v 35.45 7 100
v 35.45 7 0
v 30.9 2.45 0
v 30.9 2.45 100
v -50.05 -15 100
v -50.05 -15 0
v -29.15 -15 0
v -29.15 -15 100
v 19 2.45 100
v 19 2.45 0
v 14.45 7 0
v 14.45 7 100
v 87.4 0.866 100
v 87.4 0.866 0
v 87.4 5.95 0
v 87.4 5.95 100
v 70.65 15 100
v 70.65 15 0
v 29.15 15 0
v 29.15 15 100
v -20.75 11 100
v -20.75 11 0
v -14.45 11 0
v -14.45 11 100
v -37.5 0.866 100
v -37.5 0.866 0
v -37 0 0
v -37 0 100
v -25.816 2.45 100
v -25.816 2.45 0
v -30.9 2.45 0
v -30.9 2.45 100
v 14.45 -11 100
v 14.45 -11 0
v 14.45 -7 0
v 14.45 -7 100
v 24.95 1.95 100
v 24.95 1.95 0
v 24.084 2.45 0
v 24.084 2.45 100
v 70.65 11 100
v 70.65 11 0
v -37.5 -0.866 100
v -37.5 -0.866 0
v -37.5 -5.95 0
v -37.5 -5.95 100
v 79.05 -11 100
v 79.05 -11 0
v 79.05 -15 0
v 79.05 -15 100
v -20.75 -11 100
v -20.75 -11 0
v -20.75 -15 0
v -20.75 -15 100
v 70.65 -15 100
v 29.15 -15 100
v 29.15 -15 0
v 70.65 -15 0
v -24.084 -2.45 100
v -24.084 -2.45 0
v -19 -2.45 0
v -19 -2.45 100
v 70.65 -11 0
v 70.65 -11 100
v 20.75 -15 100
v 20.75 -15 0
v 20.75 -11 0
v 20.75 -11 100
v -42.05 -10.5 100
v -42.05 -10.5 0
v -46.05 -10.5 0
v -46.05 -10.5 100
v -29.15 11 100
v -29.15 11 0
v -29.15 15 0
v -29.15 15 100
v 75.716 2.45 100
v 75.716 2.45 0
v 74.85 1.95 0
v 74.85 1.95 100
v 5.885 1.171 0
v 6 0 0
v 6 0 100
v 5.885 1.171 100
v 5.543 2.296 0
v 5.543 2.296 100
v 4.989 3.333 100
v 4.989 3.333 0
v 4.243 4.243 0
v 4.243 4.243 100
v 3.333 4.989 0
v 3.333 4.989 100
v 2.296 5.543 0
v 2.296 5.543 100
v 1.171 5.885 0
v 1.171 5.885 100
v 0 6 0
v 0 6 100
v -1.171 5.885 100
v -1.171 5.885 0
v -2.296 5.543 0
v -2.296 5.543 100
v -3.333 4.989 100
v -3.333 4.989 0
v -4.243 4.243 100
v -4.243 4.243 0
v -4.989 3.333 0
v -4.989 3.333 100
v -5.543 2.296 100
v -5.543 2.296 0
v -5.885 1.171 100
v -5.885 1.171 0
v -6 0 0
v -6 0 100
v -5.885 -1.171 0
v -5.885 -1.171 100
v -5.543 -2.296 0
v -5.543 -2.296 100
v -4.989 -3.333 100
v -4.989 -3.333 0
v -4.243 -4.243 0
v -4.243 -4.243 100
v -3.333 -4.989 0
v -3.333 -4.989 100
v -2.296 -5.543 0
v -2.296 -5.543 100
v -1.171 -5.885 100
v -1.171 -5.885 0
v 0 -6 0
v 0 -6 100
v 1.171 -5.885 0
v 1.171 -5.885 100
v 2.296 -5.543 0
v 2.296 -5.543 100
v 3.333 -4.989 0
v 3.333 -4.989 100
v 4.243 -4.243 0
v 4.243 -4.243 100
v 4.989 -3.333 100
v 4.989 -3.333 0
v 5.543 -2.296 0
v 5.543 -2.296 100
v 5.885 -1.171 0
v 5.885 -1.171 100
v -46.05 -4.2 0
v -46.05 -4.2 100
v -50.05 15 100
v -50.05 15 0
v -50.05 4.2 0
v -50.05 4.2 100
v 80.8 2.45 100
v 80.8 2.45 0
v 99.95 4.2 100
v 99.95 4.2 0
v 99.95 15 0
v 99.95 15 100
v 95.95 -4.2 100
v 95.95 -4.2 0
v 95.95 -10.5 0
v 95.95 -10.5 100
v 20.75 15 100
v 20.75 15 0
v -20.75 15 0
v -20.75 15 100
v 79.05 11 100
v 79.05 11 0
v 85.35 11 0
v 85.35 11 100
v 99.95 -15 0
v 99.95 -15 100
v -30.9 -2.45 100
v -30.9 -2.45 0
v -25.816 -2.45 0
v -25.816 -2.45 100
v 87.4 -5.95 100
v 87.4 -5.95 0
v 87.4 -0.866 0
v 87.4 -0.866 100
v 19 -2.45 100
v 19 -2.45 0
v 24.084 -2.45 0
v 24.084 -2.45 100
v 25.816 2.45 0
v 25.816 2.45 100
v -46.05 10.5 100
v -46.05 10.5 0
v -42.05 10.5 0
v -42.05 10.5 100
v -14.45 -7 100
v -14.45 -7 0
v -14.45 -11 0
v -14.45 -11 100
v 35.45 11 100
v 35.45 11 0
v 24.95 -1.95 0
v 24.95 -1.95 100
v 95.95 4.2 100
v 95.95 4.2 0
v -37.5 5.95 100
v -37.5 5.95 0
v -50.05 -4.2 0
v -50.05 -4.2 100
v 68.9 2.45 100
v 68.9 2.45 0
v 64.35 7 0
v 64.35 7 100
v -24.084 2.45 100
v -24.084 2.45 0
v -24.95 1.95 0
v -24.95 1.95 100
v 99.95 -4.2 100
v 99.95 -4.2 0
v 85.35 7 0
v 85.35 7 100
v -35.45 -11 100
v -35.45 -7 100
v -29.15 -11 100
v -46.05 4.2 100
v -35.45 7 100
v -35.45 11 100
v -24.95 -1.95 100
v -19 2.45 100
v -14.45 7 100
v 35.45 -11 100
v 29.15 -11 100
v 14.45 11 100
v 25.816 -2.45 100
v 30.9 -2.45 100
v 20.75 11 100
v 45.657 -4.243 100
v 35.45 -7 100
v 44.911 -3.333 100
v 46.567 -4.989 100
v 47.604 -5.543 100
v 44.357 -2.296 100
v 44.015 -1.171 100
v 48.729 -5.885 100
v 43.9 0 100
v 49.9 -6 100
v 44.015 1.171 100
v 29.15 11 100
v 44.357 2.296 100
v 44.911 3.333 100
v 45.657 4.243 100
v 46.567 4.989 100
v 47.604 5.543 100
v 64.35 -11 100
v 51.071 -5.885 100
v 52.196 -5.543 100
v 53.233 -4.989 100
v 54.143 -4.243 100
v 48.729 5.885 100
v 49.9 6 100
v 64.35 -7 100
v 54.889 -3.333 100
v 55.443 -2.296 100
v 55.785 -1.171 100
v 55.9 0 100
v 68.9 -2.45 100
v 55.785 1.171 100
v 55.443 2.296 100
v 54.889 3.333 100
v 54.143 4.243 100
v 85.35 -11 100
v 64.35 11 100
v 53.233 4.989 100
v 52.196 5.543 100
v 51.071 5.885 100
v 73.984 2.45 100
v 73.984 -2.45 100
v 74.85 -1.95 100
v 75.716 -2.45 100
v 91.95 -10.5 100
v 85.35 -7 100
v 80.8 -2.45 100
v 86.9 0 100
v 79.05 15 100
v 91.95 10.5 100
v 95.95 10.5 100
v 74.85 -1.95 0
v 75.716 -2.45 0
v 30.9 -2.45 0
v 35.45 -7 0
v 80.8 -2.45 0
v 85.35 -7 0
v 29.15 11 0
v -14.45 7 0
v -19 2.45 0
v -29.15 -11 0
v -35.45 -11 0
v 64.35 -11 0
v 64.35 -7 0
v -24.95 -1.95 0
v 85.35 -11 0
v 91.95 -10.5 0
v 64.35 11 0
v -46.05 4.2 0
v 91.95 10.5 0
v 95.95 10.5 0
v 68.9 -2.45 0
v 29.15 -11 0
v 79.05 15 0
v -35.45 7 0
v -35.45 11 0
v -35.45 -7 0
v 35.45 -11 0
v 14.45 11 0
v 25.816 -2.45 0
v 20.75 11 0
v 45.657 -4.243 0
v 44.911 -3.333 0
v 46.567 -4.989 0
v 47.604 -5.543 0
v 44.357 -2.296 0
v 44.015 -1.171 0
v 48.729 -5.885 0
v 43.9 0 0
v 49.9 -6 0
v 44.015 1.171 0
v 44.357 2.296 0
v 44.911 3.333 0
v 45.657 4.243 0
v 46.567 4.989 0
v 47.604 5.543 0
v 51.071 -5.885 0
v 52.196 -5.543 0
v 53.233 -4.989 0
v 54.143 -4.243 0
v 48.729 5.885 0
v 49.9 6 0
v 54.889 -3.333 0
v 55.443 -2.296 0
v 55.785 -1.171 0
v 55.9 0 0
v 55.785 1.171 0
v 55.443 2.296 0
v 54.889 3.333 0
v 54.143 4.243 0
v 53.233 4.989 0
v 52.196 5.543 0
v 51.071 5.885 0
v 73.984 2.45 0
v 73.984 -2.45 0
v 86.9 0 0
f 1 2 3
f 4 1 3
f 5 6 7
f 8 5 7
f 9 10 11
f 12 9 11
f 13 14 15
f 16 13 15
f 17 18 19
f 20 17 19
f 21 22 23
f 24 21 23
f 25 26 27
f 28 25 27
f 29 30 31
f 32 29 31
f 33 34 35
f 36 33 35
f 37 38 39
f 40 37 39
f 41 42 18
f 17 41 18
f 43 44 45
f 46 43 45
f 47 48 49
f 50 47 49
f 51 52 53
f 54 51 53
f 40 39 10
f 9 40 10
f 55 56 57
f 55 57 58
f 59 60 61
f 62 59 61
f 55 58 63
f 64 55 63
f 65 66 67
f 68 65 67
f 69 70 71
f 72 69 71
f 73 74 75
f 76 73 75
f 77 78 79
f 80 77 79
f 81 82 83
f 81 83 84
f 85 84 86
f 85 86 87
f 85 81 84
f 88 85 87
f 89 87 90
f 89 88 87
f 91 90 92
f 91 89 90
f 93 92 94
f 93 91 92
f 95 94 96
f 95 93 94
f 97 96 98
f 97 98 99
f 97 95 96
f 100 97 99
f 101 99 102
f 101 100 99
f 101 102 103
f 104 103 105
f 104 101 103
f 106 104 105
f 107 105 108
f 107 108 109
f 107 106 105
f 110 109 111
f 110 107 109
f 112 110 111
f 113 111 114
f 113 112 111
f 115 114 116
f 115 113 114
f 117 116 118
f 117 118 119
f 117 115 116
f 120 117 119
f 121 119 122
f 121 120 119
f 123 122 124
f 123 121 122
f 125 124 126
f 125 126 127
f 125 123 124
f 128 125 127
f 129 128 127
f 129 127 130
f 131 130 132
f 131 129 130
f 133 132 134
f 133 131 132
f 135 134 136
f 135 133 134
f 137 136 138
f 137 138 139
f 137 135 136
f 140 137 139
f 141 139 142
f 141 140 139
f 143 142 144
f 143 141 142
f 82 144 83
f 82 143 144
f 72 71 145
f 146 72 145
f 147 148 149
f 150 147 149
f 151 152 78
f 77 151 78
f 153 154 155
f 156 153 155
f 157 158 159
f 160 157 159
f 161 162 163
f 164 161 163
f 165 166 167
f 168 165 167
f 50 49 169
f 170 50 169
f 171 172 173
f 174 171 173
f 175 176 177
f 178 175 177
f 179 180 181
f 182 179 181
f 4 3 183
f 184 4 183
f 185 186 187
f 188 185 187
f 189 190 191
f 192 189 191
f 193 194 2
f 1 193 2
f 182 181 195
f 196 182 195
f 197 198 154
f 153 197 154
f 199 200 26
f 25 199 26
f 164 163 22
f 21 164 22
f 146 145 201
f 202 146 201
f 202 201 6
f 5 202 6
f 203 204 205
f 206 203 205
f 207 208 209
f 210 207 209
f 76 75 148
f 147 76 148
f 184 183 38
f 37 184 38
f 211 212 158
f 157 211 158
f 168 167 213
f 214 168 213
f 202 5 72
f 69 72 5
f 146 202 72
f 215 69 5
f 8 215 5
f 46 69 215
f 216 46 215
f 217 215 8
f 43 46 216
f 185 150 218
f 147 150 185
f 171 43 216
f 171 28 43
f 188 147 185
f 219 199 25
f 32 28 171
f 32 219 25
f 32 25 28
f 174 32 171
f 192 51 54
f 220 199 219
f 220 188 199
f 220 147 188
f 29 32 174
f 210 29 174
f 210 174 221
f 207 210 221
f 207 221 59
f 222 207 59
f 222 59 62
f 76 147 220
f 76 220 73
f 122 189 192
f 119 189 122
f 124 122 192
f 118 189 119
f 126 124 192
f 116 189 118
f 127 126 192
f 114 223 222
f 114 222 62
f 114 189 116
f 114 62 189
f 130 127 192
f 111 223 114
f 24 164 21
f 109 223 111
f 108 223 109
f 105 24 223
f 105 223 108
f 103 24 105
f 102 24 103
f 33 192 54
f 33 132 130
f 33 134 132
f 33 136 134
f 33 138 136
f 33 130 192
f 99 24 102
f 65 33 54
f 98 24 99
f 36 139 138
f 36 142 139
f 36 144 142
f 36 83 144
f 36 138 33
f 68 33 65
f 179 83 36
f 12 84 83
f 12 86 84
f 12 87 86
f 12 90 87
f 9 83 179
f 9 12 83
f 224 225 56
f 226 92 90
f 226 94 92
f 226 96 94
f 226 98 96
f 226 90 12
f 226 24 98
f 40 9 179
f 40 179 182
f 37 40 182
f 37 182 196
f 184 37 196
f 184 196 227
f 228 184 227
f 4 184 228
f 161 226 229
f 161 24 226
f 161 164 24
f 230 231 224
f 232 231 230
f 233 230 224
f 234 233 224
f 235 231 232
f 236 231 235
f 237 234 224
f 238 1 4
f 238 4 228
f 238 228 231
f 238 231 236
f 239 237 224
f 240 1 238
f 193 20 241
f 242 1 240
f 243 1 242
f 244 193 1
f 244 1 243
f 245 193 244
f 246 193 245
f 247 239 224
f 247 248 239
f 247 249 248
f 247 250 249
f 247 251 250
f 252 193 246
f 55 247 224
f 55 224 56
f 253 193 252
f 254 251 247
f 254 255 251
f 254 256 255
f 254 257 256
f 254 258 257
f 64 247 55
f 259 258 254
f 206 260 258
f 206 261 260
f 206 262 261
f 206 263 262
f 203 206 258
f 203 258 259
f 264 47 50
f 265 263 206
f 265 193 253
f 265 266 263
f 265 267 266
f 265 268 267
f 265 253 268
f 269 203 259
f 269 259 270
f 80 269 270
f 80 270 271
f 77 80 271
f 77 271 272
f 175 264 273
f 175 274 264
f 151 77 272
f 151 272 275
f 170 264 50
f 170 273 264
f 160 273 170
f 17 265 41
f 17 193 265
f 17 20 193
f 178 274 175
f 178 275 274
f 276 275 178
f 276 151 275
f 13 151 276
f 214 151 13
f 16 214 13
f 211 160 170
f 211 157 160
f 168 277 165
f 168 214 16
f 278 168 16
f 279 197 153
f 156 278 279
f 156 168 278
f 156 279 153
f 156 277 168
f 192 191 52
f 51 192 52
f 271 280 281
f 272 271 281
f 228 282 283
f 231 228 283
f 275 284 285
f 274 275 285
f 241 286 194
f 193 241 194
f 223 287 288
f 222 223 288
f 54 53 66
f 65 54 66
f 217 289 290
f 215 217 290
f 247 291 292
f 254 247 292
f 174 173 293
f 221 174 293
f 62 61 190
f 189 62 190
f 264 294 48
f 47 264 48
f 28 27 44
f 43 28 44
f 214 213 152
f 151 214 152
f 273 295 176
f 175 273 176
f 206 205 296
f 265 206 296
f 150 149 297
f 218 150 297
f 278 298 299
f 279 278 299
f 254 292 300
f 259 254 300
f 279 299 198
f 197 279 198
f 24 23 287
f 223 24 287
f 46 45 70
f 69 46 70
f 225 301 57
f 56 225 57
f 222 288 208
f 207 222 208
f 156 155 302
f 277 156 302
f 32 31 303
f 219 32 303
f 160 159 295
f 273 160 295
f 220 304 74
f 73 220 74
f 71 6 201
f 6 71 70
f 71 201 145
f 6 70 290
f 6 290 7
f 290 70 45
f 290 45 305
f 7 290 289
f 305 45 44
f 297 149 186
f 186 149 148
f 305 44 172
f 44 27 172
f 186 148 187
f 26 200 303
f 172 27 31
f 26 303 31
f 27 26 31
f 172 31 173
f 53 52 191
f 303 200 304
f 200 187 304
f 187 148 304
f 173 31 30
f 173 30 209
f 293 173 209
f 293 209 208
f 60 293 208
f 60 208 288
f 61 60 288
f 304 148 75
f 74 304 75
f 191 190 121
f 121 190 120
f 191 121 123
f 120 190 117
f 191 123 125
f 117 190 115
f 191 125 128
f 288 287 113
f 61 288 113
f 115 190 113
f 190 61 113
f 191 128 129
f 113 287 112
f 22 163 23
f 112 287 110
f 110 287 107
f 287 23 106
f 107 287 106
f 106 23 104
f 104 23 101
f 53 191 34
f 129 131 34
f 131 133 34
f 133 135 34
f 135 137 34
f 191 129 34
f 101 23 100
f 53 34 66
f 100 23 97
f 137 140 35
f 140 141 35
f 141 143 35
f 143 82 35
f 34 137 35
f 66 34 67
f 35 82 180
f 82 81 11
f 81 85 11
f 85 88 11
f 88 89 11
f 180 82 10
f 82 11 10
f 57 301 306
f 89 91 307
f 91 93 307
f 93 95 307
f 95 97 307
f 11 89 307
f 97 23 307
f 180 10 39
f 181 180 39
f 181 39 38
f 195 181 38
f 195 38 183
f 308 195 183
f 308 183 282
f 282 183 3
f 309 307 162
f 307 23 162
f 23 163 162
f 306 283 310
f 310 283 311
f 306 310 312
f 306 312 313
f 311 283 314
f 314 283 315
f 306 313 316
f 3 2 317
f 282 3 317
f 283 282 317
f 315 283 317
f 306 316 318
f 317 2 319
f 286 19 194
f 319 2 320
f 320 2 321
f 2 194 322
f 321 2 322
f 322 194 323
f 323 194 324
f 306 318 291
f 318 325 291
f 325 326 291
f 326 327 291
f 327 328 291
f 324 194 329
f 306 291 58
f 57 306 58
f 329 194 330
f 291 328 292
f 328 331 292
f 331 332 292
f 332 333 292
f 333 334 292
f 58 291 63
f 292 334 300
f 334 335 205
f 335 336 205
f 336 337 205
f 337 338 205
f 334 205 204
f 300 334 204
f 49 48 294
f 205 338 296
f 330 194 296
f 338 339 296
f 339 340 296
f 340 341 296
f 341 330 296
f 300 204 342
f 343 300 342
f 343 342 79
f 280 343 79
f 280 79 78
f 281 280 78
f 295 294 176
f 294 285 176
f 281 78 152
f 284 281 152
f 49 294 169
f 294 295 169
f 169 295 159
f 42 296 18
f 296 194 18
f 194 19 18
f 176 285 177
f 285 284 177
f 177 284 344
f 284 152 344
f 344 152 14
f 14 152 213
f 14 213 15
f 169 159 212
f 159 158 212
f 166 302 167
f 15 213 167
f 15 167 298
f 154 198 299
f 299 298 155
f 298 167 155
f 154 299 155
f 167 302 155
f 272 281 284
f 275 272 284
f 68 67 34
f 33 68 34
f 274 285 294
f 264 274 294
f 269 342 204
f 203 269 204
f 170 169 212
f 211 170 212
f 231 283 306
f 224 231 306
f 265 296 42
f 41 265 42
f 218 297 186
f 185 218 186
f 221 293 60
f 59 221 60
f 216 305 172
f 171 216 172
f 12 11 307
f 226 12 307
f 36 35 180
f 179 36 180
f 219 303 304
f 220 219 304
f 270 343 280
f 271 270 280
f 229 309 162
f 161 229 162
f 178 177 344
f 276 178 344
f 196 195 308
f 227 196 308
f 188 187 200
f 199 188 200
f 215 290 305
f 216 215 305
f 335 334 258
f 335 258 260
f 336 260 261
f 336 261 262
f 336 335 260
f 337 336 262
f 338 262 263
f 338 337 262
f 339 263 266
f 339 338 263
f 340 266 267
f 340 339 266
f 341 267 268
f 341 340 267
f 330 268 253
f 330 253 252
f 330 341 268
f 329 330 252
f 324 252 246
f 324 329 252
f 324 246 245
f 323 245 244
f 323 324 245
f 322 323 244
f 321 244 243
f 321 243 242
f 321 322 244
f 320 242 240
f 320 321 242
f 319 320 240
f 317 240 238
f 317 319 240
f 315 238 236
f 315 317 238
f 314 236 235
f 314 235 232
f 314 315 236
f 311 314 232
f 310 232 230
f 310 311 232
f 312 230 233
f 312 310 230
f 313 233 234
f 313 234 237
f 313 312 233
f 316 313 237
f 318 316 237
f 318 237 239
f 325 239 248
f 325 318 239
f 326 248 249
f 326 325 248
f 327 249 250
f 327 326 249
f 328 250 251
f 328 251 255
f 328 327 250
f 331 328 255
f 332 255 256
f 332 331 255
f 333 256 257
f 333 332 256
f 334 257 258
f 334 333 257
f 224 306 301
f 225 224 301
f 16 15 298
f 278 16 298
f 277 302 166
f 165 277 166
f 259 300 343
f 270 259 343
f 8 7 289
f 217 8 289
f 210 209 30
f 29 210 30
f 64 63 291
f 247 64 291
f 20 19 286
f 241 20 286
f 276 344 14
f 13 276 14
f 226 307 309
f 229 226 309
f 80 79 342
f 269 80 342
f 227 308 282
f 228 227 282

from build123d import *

# Parameters (mm, degrees)
SKETCH_1_R      = 6
EXTRUDE_1_DEPTH = 100


with BuildPart() as part:
    # 草图1 → 凸台-拉伸1 (new body)
    with BuildSketch(Plane.XY):
        Polygon((99.95, 4.2), (99.95, 15), (79.05, 15), (79.05, 11), (85.35, 11), (85.35, 7), (80.8, 2.45), (75.716025404, 2.45), (74.85, 1.95), (73.983974596, 2.45), (68.9, 2.45), (64.35, 7), (64.35, 11), (70.65, 11), (70.65, 15), (29.15, 15), (29.15, 11), (35.45, 11), (35.45, 7), (30.9, 2.45), (25.816025404, 2.45), (24.95, 1.95), (24.083974596, 2.45), (19, 2.45), (14.45, 7), (14.45, 11), (20.75, 11), (20.75, 15), (-20.75, 15), (-20.75, 11), (-14.45, 11), (-14.45, 7), (-19, 2.45), (-24.083974596, 2.45), (-24.95, 1.95), (-25.816025404, 2.45), (-30.9, 2.45), (-35.45, 7), (-35.45, 11), (-29.15, 11), (-29.15, 15), (-50.05, 15), (-50.05, 4.2), (-46.05, 4.2), (-46.05, 10.5), (-42.05, 10.5), (-37.5, 5.95), (-37.5, 0.866025404), (-37, 0), (-37.5, -0.866025404), (-37.5, -5.95), (-42.05, -10.5), (-46.05, -10.5), (-46.05, -4.2), (-50.05, -4.2), (-50.05, -15), (-29.15, -15), (-29.15, -11), (-35.45, -11), (-35.45, -7), (-30.9, -2.45), (-25.816025404, -2.45), (-24.95, -1.95), (-24.083974596, -2.45), (-19, -2.45), (-14.45, -7), (-14.45, -11), (-20.75, -11), (-20.75, -15), (20.75, -15), (20.75, -11), (14.45, -11), (14.45, -7), (19, -2.45), (24.083974596, -2.45), (24.95, -1.95), (25.816025404, -2.45), (30.9, -2.45), (35.45, -7), (35.45, -11), (29.15, -11), (29.15, -15), (70.65, -15), (70.65, -11), (64.35, -11), (64.35, -7), (68.9, -2.45), (73.983974596, -2.45), (74.85, -1.95), (75.716025404, -2.45), (80.8, -2.45), (85.35, -7), (85.35, -11), (79.05, -11), (79.05, -15), (99.95, -15), (99.95, -4.2), (95.95, -4.2), (95.95, -10.5), (91.95, -10.5), (87.4, -5.95), (87.4, -0.866025404), (86.9, 0), (87.4, 0.866025404), (87.4, 5.95), (91.95, 10.5), (95.95, 10.5), (95.95, 4.2), align=None)
        Circle(SKETCH_1_R, mode=Mode.SUBTRACT)
        with Locations((49.9, 0)):
            Circle(SKETCH_1_R, mode=Mode.SUBTRACT)
    extrude(amount=EXTRUDE_1_DEPTH)


solid = part.part
